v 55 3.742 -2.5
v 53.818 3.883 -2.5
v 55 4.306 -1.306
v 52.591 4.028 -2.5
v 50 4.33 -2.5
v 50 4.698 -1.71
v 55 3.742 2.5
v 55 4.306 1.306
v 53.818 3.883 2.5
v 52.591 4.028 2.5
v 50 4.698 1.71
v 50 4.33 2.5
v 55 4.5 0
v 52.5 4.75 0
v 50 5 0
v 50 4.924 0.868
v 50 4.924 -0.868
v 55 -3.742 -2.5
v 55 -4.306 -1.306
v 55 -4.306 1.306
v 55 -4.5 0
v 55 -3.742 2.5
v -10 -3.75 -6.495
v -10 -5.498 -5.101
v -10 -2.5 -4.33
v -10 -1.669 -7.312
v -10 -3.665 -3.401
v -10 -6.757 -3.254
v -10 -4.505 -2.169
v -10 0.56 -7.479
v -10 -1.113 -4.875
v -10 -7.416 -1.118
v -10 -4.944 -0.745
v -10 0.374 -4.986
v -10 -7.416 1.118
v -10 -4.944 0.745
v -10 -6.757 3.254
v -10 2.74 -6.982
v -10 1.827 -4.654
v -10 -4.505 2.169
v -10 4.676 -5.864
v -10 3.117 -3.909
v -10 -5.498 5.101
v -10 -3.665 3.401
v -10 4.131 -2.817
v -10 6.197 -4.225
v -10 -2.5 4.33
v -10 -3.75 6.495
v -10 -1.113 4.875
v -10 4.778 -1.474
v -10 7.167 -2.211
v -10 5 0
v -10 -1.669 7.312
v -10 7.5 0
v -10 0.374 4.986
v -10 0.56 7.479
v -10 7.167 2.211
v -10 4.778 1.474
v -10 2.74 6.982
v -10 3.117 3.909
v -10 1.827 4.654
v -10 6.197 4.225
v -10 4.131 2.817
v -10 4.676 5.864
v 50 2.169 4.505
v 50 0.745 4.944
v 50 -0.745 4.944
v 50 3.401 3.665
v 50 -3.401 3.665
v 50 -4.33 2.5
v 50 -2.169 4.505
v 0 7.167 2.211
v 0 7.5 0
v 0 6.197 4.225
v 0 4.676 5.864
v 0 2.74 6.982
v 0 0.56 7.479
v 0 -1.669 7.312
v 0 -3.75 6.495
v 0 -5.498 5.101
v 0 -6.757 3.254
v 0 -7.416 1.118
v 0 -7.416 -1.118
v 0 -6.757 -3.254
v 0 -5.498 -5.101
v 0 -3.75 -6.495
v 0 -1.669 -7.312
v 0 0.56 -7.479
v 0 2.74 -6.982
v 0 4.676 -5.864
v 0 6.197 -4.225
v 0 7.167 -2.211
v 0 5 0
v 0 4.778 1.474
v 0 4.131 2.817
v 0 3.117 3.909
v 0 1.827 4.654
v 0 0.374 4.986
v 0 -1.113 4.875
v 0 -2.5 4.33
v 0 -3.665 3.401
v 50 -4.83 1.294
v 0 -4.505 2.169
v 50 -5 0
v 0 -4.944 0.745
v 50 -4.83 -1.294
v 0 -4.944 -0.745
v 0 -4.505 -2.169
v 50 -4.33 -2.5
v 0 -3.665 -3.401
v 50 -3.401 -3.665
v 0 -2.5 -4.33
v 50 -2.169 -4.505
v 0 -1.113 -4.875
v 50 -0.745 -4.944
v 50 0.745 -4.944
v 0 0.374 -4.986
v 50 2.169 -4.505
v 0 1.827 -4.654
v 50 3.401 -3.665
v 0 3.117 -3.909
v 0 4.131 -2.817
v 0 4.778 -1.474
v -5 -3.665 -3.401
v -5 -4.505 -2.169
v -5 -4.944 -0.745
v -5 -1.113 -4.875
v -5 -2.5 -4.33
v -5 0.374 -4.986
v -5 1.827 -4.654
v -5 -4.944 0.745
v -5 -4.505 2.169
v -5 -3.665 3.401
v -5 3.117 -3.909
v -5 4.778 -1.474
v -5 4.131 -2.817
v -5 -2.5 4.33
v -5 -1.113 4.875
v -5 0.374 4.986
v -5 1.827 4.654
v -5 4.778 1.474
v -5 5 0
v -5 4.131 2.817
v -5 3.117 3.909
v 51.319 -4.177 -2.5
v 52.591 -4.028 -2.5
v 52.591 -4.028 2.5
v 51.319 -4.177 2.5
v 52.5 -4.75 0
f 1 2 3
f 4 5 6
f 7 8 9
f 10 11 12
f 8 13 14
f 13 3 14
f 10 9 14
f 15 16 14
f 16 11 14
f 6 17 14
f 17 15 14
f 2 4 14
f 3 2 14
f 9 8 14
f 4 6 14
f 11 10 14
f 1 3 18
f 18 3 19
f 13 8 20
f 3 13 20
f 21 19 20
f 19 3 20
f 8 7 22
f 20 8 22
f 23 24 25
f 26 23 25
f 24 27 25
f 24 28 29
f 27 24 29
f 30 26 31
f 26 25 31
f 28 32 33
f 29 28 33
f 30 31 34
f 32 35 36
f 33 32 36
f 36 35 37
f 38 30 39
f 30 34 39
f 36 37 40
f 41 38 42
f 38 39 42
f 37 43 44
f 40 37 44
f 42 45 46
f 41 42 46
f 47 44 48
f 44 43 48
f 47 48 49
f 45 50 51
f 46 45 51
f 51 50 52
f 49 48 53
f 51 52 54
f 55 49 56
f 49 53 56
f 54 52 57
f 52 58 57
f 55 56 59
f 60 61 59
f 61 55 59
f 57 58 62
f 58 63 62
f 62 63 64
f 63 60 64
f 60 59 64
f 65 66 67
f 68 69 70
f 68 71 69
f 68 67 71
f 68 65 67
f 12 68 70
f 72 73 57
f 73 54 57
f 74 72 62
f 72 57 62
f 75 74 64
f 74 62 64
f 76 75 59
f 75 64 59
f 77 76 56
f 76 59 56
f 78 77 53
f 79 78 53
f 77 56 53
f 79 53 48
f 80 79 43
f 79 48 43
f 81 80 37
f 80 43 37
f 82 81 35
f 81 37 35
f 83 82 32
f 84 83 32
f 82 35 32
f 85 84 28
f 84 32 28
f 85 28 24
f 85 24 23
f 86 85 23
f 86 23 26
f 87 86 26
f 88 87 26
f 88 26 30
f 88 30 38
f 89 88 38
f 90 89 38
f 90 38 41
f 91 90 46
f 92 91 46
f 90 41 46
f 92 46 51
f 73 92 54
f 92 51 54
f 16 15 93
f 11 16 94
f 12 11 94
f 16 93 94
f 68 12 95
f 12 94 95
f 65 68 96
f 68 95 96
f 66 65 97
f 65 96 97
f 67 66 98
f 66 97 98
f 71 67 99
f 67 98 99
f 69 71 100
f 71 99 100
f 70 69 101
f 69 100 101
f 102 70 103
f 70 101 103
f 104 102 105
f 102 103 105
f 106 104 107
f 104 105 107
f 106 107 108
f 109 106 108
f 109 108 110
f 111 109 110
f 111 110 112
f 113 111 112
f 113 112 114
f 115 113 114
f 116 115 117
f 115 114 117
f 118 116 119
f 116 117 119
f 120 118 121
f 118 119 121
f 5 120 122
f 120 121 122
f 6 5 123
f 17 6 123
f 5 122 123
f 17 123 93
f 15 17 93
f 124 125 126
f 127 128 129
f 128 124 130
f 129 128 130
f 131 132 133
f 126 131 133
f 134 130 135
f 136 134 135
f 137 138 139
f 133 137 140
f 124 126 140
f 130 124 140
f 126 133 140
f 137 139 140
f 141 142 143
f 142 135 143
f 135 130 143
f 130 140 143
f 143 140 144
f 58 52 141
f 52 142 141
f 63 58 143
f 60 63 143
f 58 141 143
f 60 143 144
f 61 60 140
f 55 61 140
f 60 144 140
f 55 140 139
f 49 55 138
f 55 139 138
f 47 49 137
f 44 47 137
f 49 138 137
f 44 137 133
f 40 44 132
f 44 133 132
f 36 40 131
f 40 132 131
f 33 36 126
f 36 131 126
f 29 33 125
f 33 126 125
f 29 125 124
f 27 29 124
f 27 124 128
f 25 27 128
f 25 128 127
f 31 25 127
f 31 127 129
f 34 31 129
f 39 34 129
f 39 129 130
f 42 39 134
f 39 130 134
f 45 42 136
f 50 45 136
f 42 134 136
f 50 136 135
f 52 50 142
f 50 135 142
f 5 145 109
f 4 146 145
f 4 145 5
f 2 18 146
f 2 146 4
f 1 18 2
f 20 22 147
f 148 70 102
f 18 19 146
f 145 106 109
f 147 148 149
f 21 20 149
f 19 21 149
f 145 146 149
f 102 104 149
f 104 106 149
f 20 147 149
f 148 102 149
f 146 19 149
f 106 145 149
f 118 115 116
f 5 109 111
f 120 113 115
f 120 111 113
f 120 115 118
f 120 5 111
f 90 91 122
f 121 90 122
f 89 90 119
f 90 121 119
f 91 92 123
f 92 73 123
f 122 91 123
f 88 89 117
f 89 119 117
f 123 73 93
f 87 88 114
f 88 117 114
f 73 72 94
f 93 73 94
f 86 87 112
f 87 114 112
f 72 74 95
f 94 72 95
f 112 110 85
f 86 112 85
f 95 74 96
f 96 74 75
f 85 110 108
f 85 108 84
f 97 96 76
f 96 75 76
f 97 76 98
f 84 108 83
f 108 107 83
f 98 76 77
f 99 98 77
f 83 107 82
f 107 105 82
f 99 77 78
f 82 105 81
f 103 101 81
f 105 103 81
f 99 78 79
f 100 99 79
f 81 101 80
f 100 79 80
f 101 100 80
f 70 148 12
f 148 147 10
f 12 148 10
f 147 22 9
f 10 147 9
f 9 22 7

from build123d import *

# Parameters (mm, degrees)
SKETCH2_W          = 2.5
SKETCH2_H          = 8.660254038
CUT_EXTRUDE1_DEPTH = 5


with BuildPart() as part:
    # Sketch1 → Revolve1 (revolve)
    with BuildSketch(Plane.XY):
        Polygon((-5, 5), (-5, 0), (0, 0), (0, 5), (0, 7.5), (-10, 7.5), (-10, 5), align=None)
        Polygon((50, 5), (0, 5), (0, 0), (55, 0), (55, 4.5), align=None)
    revolve(axis=Axis((0, 0, 0), (1, 0, 0)))

    # Sketch2 → Cut-Extrude1 (cut)
    with BuildSketch(Plane(origin=(55, 0, 0), x_dir=(0, 0, -1), z_dir=(1, 0, 0))):
        with Locations((-3.75, 0)):
            Rectangle(SKETCH2_W, SKETCH2_H)
        with Locations((3.75, 0)):
            Rectangle(SKETCH2_W, SKETCH2_H)
    extrude(amount=-CUT_EXTRUDE1_DEPTH, mode=Mode.SUBTRACT)


solid = part.part
